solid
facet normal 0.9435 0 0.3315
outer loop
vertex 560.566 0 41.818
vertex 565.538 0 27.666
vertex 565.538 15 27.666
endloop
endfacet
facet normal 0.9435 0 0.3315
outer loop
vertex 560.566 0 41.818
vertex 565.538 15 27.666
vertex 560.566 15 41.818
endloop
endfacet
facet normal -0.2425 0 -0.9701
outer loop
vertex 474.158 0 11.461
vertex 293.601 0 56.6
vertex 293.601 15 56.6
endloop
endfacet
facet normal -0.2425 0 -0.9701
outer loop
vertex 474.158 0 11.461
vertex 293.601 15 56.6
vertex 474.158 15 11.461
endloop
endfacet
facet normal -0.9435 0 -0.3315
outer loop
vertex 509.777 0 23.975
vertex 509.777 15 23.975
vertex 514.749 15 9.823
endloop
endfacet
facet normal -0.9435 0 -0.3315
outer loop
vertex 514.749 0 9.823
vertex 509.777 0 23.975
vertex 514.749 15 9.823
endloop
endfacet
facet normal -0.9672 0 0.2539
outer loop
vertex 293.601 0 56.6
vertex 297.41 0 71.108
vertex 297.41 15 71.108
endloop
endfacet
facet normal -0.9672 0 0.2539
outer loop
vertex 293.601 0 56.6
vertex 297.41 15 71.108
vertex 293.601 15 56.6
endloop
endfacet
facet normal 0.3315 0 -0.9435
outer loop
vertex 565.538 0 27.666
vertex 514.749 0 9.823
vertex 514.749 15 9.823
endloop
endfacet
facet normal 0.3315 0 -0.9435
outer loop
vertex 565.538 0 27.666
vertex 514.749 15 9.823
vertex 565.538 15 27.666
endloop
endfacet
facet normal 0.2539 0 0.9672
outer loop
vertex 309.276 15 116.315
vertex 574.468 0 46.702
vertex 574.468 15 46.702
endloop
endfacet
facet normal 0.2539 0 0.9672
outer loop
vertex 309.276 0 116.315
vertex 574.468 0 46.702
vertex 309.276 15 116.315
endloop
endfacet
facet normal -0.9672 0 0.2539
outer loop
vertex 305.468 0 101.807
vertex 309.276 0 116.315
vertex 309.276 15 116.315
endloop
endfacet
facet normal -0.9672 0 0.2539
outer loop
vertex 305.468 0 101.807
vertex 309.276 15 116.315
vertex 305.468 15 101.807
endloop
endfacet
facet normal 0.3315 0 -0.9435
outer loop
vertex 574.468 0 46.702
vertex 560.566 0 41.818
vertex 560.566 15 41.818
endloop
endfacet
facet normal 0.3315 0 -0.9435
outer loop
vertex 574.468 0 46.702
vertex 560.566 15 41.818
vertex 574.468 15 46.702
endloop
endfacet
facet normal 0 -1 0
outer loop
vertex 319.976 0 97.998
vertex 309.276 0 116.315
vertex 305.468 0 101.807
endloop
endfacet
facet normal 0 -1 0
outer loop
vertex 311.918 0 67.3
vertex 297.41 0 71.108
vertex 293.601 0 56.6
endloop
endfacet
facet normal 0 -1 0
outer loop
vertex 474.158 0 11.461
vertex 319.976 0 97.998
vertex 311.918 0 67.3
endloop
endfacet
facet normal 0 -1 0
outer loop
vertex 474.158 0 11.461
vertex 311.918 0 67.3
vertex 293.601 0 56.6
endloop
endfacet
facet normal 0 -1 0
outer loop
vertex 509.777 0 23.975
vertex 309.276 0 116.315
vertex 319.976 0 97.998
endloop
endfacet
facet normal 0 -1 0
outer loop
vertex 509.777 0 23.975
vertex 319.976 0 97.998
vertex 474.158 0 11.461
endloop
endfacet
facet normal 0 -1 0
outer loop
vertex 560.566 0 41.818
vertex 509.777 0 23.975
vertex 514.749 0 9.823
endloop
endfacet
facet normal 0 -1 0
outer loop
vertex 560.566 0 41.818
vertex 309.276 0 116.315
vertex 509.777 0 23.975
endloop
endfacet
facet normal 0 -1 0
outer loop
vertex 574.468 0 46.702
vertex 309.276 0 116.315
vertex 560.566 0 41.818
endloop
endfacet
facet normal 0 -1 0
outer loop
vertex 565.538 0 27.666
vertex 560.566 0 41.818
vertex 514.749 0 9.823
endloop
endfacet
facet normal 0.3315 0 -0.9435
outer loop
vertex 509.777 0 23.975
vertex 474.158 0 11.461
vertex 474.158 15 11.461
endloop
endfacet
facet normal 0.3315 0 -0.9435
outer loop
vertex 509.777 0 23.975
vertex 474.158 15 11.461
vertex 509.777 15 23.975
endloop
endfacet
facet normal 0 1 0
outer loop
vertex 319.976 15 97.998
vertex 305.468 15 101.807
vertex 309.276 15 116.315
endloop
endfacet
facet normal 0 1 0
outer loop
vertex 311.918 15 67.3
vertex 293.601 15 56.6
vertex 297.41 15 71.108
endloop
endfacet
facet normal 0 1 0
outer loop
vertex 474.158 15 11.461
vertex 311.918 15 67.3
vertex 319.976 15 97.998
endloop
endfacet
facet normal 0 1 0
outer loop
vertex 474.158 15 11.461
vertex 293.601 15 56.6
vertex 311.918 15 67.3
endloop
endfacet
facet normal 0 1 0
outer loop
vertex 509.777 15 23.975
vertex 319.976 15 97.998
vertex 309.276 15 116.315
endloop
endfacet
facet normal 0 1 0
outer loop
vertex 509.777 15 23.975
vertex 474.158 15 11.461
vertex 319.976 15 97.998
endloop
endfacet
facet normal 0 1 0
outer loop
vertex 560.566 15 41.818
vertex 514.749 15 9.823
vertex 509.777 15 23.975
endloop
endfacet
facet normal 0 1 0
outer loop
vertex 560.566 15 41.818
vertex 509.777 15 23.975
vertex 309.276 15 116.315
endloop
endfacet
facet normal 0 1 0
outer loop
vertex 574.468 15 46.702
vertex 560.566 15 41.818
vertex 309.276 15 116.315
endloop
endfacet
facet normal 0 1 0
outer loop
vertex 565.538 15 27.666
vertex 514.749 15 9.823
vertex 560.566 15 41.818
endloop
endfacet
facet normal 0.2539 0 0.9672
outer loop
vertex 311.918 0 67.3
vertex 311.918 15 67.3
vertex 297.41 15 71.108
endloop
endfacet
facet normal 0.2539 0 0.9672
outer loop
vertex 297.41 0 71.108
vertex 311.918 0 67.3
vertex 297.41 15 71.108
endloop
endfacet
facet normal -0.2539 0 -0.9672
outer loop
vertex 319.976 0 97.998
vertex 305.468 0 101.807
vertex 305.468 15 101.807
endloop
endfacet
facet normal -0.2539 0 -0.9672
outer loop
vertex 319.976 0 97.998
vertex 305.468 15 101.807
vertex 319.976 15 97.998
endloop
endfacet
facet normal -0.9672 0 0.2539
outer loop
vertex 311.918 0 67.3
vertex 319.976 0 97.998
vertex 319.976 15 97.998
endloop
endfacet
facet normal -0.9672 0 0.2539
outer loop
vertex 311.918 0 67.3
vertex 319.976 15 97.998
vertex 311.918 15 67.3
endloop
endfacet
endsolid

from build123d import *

# Parameters (mm, degrees)
BOSS_EXTRUDE1_DEPTH             = 15
BOSS_EXTRUDE2_REACH             = 1239.023
BOSS_EXTRUDE2_DIRECTION_2_REACH = 1239.023
CUT_EXTRUDE2_DEPTH              = 1238.578280352
CUT_EXTRUDE2_DEPTH_BACK         = 1238.578280352
SKETCH5_W                       = 40
SKETCH5_H                       = 40
CUT_EXTRUDE3_DEPTH              = 1238.578280352
BOSS_EXTRUDE4_DEPTH             = 75
CUT_EXTRUDE4_DEPTH              = 1241.107934819
CUT_EXTRUDE4_DEPTH_BACK         = 1241.107934819
SKETCH8_W                       = 15
SKETCH8_H                       = 73.7
FILLET1_R                       = 5
CUT_EXTRUDE5_DEPTH              = 1241.107934819
CUT_EXTRUDE5_DEPTH_BACK         = 1241.107934819
SKETCH9_W                       = 25
SKETCH9_H                       = 15
SKETCH9_W_2                     = 15
CUT_EXTRUDE6_DEPTH              = 1241.107934819
CUT_EXTRUDE6_DEPTH_BACK         = 1241.107934819
SKETCH10_W                      = 1728.920732784
SKETCH10_H                      = 178.853868908
SKETCH10_W_2                    = 1650
SKETCH10_H_2                    = 15
SKETCH11_W                      = 1852.680615207
SKETCH11_H                      = 1075.927112831
CUT_EXTRUDE7_DEPTH              = 1238.022635201


with BuildPart() as part:
    # Sketch1 → Boss-Extrude1 (new body)
    with BuildSketch(Plane(origin=(0, 0, 0), x_dir=(1, 0, 0), z_dir=(0, 1, 0))):
        Polygon((-450, 300), (-400, 300), (-200, 250), (600, 40), (1200, 40), (1200, -40), (600, -40), (-200, -250), (-400, -300), (-450, -300), align=None)
    extrude(amount=BOSS_EXTRUDE1_DEPTH)

    # Boss-Extrude2: up to this face of the body (flat: up to its plane)
    boss_extrude2_end = Plane(part.part.faces().sort_by_distance((-425, 7.5, 300))[0])
    # Sketch2 → Boss-Extrude2 (add, up to the picked face)
    with BuildSketch(Plane.XY, mode=Mode.PRIVATE) as boss_extrude2_sk1:
        with BuildLine():
            Line((-425, 0), (-450, 0))
            Line((-450, 0), (-450, -40))
            Line((-450, -40), (-440, -40))
            Line((-440, -40), (-440, -15))
            ThreePointArc((-440, -15), (-435.606601718, -4.393398282), (-425, 0))
        make_face()
    boss_extrude2_tool1 = split(extrude(boss_extrude2_sk1.sketch, amount=BOSS_EXTRUDE2_REACH, mode=Mode.PRIVATE), bisect_by=boss_extrude2_end, keep=Keep.BOTH, mode=Mode.PRIVATE)
    # Sketch2 → Boss-Extrude2 (add, up to the picked face)
    with BuildSketch(Plane.XY, mode=Mode.PRIVATE) as boss_extrude2_sk2:
        with BuildLine():
            Line((-400, 0), (-425, 0))
            ThreePointArc((-425, 0), (-414.393398282, -4.393398282), (-410, -15))
            Line((-410, -15), (-410, -40))
            Line((-410, -40), (-400, -40))
            Line((-400, -40), (-400, 0))
        make_face()
    boss_extrude2_tool2 = split(extrude(boss_extrude2_sk2.sketch, amount=BOSS_EXTRUDE2_REACH, mode=Mode.PRIVATE), bisect_by=boss_extrude2_end, keep=Keep.BOTH, mode=Mode.PRIVATE)
    add(boss_extrude2_tool1.solids().sort_by(Axis((-444.100555, -18.206662, 0), (0, 0, 1)))[0])
    add(boss_extrude2_tool2.solids().sort_by(Axis((-405.899445, -18.206662, 0), (0, 0, 1)))[0])

    # Boss-Extrude2 direction 2: up to this face of the body (flat: up to its plane)
    boss_extrude2_direction_2_end = Plane(part.part.faces().sort_by_distance((-425, 7.5, -300))[0])
    # Sketch2 → Boss-Extrude2 direction 2 (add, up to the picked face)
    with BuildSketch(Plane.XY, mode=Mode.PRIVATE) as boss_extrude2_direction_2_sk1:
        with BuildLine():
            Line((-425, 0), (-450, 0))
            Line((-450, 0), (-450, -40))
            Line((-450, -40), (-440, -40))
            Line((-440, -40), (-440, -15))
            ThreePointArc((-440, -15), (-435.606601718, -4.393398282), (-425, 0))
        make_face()
    boss_extrude2_direction_2_tool1 = split(extrude(boss_extrude2_direction_2_sk1.sketch, amount=-BOSS_EXTRUDE2_DIRECTION_2_REACH, mode=Mode.PRIVATE), bisect_by=boss_extrude2_direction_2_end, keep=Keep.BOTH, mode=Mode.PRIVATE)
    # Sketch2 → Boss-Extrude2 direction 2 (add, up to the picked face)
    with BuildSketch(Plane.XY, mode=Mode.PRIVATE) as boss_extrude2_direction_2_sk2:
        with BuildLine():
            Line((-400, 0), (-425, 0))
            ThreePointArc((-425, 0), (-414.393398282, -4.393398282), (-410, -15))
            Line((-410, -15), (-410, -40))
            Line((-410, -40), (-400, -40))
            Line((-400, -40), (-400, 0))
        make_face()
    boss_extrude2_direction_2_tool2 = split(extrude(boss_extrude2_direction_2_sk2.sketch, amount=-BOSS_EXTRUDE2_DIRECTION_2_REACH, mode=Mode.PRIVATE), bisect_by=boss_extrude2_direction_2_end, keep=Keep.BOTH, mode=Mode.PRIVATE)
    add(boss_extrude2_direction_2_tool1.solids().sort_by(Axis((-444.100555, -18.206662, 0), (0, 0, -1)))[0])
    add(boss_extrude2_direction_2_tool2.solids().sort_by(Axis((-405.899445, -18.206662, 0), (0, 0, -1)))[0])

    # Sketch4 → Cut-Extrude2 (cut, two sides: drawn at the far end of the back side and taken through both)
    with BuildSketch(Plane(origin=(0, 0, 0), x_dir=(1, 0, 0), z_dir=(0, 1, 0)).offset(-CUT_EXTRUDE2_DEPTH_BACK)):
        Polygon((-450, 230), (-400, 230), (-150, 167.5), (-150, -167.5), (-400, -230), (-450, -230), align=None)
        Polygon((-100, 155), (-100, -155), (520, 0), align=None)
    extrude(amount=CUT_EXTRUDE2_DEPTH + CUT_EXTRUDE2_DEPTH_BACK, mode=Mode.SUBTRACT)

    # Sketch5 → Cut-Extrude3 (cut, through all)
    with BuildSketch(Plane(origin=(0, 0, 0), x_dir=(0, 0, -1), z_dir=(1, 0, 0))):
        with Locations((-265, -20)):
            Rectangle(SKETCH5_W, SKETCH5_H)
        with Locations((265, -20)):
            Rectangle(SKETCH5_W, SKETCH5_H)
    extrude(amount=-CUT_EXTRUDE3_DEPTH, mode=Mode.SUBTRACT)

    # Sketch7 → Boss-Extrude4 (add)
    with BuildSketch(Plane(origin=(1200, 0, 0), x_dir=(0, 0, -1), z_dir=(1, 0, 0))):
        with BuildLine():
            Line((-87.5, 50), (-40, 15))
            Line((-40, 15), (40, 15))
            Line((40, 15), (87.5, 50))
            Line((87.5, 50), (87.5, 88.7))
            Line((87.5, 88.7), (58.5, 88.7))
            Line((58.5, 88.7), (58.5, 63.2))
            Line((58.5, 63.2), (48.5, 63.2))
            Line((48.5, 63.2), (48.5, 88.7))
            Line((48.5, 88.7), (20, 88.7))
            Line((20, 88.7), (20, 50))
            ThreePointArc((20, 50), (0, 30), (-20, 50))
            Line((-20, 50), (-20, 88.7))
            Line((-20, 88.7), (-63, 88.7))
            Line((-63, 88.7), (-63, 63.2))
            Line((-63, 63.2), (-73, 63.2))
            Line((-73, 63.2), (-73, 88.7))
            Line((-73, 88.7), (-87.5, 88.7))
            Line((-87.5, 88.7), (-87.5, 50))
        make_face()
    extrude(amount=-BOSS_EXTRUDE4_DEPTH)

    # Sketch8 → Cut-Extrude4 (cut, two sides: drawn at the far end of the back side and taken through both)
    with BuildSketch(Plane.XY.offset(-CUT_EXTRUDE4_DEPTH_BACK)):
        with Locations((1147.5, 51.85)):
            Rectangle(SKETCH8_W, SKETCH8_H)
        with Locations((1177.5, 51.85)):
            Rectangle(SKETCH8_W, SKETCH8_H)
    extrude(amount=CUT_EXTRUDE4_DEPTH + CUT_EXTRUDE4_DEPTH_BACK, mode=Mode.SUBTRACT)

    # Fillet1
    fillet1_edges = [part.edges().sort_by_distance(p)[0] for p in [
        (1192.5, 50, 87.5),
        (1162.5, 50, 87.5),
        (1132.5, 50, 87.5),
        (1192.5, 50, -87.5),
        (1162.5, 50, -87.5),
        (1132.5, 50, -87.5),
        (1192.5, 88.7, -87.5),
        (1162.5, 88.7, -87.5),
        (1132.5, 88.7, -87.5),
        (1132.5, 88.7, -58.5),
        (1162.5, 88.7, -58.5),
        (1192.5, 88.7, -58.5),
        (1192.5, 88.7, -48.5),
        (1162.5, 88.7, -48.5),
        (1132.5, 88.7, -48.5),
        (1192.5, 88.7, -20),
        (1162.5, 88.7, -20),
        (1132.5, 88.7, -20),
        (1192.5, 88.7, 63),
        (1162.5, 88.7, 63),
        (1132.5, 88.7, 63),
        (1132.5, 88.7, 87.5),
        (1162.5, 88.7, 87.5),
        (1192.5, 88.7, 87.5),
        (1192.5, 88.7, 73),
        (1162.5, 88.7, 73),
        (1132.5, 88.7, 73),
        (1192.5, 88.7, 20),
        (1162.5, 88.7, 20),
        (1132.5, 88.7, 20),
        (600, 7.5, 40),
        (600, 7.5, -40),
        (520, 7.5, 0),
        (-440, -40, -292.5),
        (-440, -40, -237.5),
        (-400, -40, -292.5),
        (-400, -40, -237.5),
        (-450, -40, -237.5),
        (-410, -40, -237.5),
        (-450, -40, -292.5),
        (-410, -40, -292.5),
        (-150, 7.5, 167.5),
        (-100, 7.5, 155),
        (-150, 7.5, -167.5),
        (-100, 7.5, -155),
        (-450, -40, 237.5),
        (-410, -40, 237.5),
        (-440, -40, 237.5),
        (-400, -40, 237.5),
        (-450, -40, 292.5),
        (-440, -40, 292.5),
        (-400, -40, 292.5),
        (-410, -40, 292.5),
    ]]
    fillet(fillet1_edges, radius=FILLET1_R - 0.0001)  # a hair under: the kernel refuses the full size

    # Sketch9 → Cut-Extrude5 (cut, two sides: drawn at the far end of the back side and taken through both)
    with BuildSketch(Plane(origin=(0, 0, 0), x_dir=(1, 0, 0), z_dir=(0, 1, 0)).offset(-CUT_EXTRUDE5_DEPTH_BACK)):
        with Locations((-425, -292.5)):
            Rectangle(SKETCH9_W, SKETCH9_H)
        with Locations((1192.5, -32.5)):
            Rectangle(SKETCH9_W_2, SKETCH9_H)
        with Locations((1192.5, 32.5)):
            Rectangle(SKETCH9_W_2, SKETCH9_H)
        with Locations((1162.5, 32.5)):
            Rectangle(SKETCH9_W_2, SKETCH9_H)
        with Locations((1132.5, 32.5)):
            Rectangle(SKETCH9_W_2, SKETCH9_H)
        with Locations((1132.5, -32.5)):
            Rectangle(SKETCH9_W_2, SKETCH9_H)
        with Locations((1162.5, -32.5)):
            Rectangle(SKETCH9_W_2, SKETCH9_H)
        with Locations((-425, -237.5)):
            Rectangle(SKETCH9_W, SKETCH9_H)
        with Locations((-425, 237.5)):
            Rectangle(SKETCH9_W, SKETCH9_H)
        with Locations((-425, 292.5)):
            Rectangle(SKETCH9_W, SKETCH9_H)
    extrude(amount=CUT_EXTRUDE5_DEPTH + CUT_EXTRUDE5_DEPTH_BACK, mode=Mode.SUBTRACT)


with BuildPart() as cut_extrude5_piece_1:
    # of the separate pieces the step leaves, piece 1, a body of its own (cut_extrude5_pieces)
    add(part.part.solids().sort_by_distance((-400, -35.0001, -300))[0])


with BuildPart() as cut_extrude5_piece_2:
    # of the separate pieces the step leaves, piece 2, a body of its own (cut_extrude5_pieces)
    add(part.part.solids().sort_by_distance((1170, 48.501289589, 85.46603587))[0])


with BuildPart() as cut_extrude5_piece_3:
    # of the separate pieces the step leaves, piece 3, a body of its own (cut_extrude5_pieces)
    add(part.part.solids().sort_by_distance((1170, 48.501289589, -85.46603587))[0])


with BuildPart() as cut_extrude5_piece_4:
    # of the separate pieces the step leaves, piece 4, a body of its own (cut_extrude5_pieces)
    add(part.part.solids().sort_by_distance((1125, 83.7001, 73))[0])


with BuildPart() as cut_extrude5_piece_5:
    # of the separate pieces the step leaves, piece 5, a body of its own (cut_extrude5_pieces)
    add(part.part.solids().sort_by_distance((1200, 48.501289589, 85.46603587))[0])


with BuildPart() as cut_extrude5_piece_6:
    # of the separate pieces the step leaves, piece 6, a body of its own (cut_extrude5_pieces)
    add(part.part.solids().sort_by_distance((1200, 48.501289589, -85.46603587))[0])


with BuildPart() as cut_extrude5_piece_7:
    # of the separate pieces the step leaves, piece 7, a body of its own (cut_extrude5_pieces)
    add(part.part.solids().sort_by_distance((1125, 88.7, -40))[0])


with BuildPart() as cut_extrude6_tool:
    # Sketch10 → Cut-Extrude6 (new, two sides: drawn at the far end of the back side and taken through both)
    with BuildSketch(Plane.XY.offset(-CUT_EXTRUDE6_DEPTH_BACK)):
        with Locations((378.379601058, 20.599691165)):
            Rectangle(SKETCH10_W, SKETCH10_H)
        with Locations((375, 7.5)):
            Rectangle(SKETCH10_W_2, SKETCH10_H_2, mode=Mode.SUBTRACT)
    extrude(amount=CUT_EXTRUDE6_DEPTH + CUT_EXTRUDE6_DEPTH_BACK)


with BuildPart() as cut_extrude5_piece_1_1:
    add(cut_extrude5_piece_1.part)

    # Cut-Extrude6: cut by cut_extrude6_tool
    add(cut_extrude6_tool.part, mode=Mode.SUBTRACT)

    # Sketch11 → Cut-Extrude7 (cut, through all)
    # profile 1 of 8: a face of its own
    with BuildSketch(Plane(origin=(0, 0, 0), x_dir=(1, 0, 0), z_dir=(0, 1, 0))):
        with Locations((324.970767393, -26.108881651)):
            Rectangle(SKETCH11_W, SKETCH11_H)
        Polygon((309.276307823, -116.314969197), (-450, -315.625), (-450, -242.5), (-450, -230), (-400, -230), (-150, -167.5), (-135, -163.75), (-115, -158.75), (-100, -155), (293.601058917, -56.599735271), (308.154197556, -52.961450611), (474.15750273, -11.460624318), (500.597149997, -4.850712501), (514.749174704, -9.82265344), (565.538165046, -27.666026778), (600.645318554, -40), (574.718248814, -46.789992423), (323.784772304, -112.50649727), align=None, mode=Mode.SUBTRACT)
    # profile 2 of 8: a face of its own
    with BuildSketch(Plane(origin=(0, 0, 0), x_dir=(1, 0, 0), z_dir=(0, 1, 0))):
        Polygon((-450, -230), (-450, -242.5), (-400, -230), align=None)
    # profile 3 of 8: a face of its own
    with BuildSketch(Plane(origin=(0, 0, 0), x_dir=(1, 0, 0), z_dir=(0, 1, 0))):
        Polygon((-450, -242.5), (-450, -315.625), (309.276307823, -116.314969197), (305.467835897, -101.806504716), (297.409530844, -71.108199751), (293.601058917, -56.599735271), (-100, -155), (-100, -182.5), (-115, -182.5), (-115, -158.75), (-135, -163.75), (-135, -182.5), (-150, -182.5), (-150, -167.5), (-400, -230), align=None)
    # profile 4 of 8: a face of its own
    with BuildSketch(Plane(origin=(0, 0, 0), x_dir=(1, 0, 0), z_dir=(0, 1, 0))):
        Polygon((-135, -163.75), (-150, -167.5), (-150, -182.5), (-135, -182.5), align=None)
    # profile 5 of 8: a face of its own
    with BuildSketch(Plane(origin=(0, 0, 0), x_dir=(1, 0, 0), z_dir=(0, 1, 0))):
        Polygon((-100, -182.5), (-100, -155), (-115, -158.75), (-115, -182.5), align=None)
    # profile 6 of 8: a face of its own
    with BuildSketch(Plane(origin=(0, 0, 0), x_dir=(1, 0, 0), z_dir=(0, 1, 0))):
        Polygon((560.566224107, -41.818051484), (574.718248814, -46.789992423), (600.645318554, -40), (565.538165046, -27.666026778), align=None)
    # profile 7 of 8: a face of its own
    with BuildSketch(Plane(origin=(0, 0, 0), x_dir=(1, 0, 0), z_dir=(0, 1, 0))):
        Polygon((474.15750273, -11.460624318), (509.777233765, -23.974678146), (514.749174704, -9.82265344), (500.597149997, -4.850712501), align=None)
    # profile 8 of 8: a face of its own
    with BuildSketch(Plane(origin=(0, 0, 0), x_dir=(1, 0, 0), z_dir=(0, 1, 0))):
        Polygon((297.409530844, -71.108199751), (305.467835897, -101.806504716), (319.976300377, -97.99803279), (311.917995324, -67.299727825), align=None)
    extrude(amount=CUT_EXTRUDE7_DEPTH, mode=Mode.SUBTRACT)


with BuildPart() as cut_extrude5_piece_2_1:
    add(cut_extrude5_piece_2.part)

    # Cut-Extrude6: cut by cut_extrude6_tool
    add(cut_extrude6_tool.part, mode=Mode.SUBTRACT)


with BuildPart() as cut_extrude5_piece_3_1:
    add(cut_extrude5_piece_3.part)

    # Cut-Extrude6: cut by cut_extrude6_tool
    add(cut_extrude6_tool.part, mode=Mode.SUBTRACT)


with BuildPart() as cut_extrude5_piece_4_1:
    add(cut_extrude5_piece_4.part)

    # Cut-Extrude6: cut by cut_extrude6_tool
    add(cut_extrude6_tool.part, mode=Mode.SUBTRACT)


with BuildPart() as cut_extrude5_piece_5_1:
    add(cut_extrude5_piece_5.part)

    # Cut-Extrude6: cut by cut_extrude6_tool
    add(cut_extrude6_tool.part, mode=Mode.SUBTRACT)


with BuildPart() as cut_extrude5_piece_6_1:
    add(cut_extrude5_piece_6.part)

    # Cut-Extrude6: cut by cut_extrude6_tool
    add(cut_extrude6_tool.part, mode=Mode.SUBTRACT)


with BuildPart() as cut_extrude5_piece_7_1:
    add(cut_extrude5_piece_7.part)

    # Cut-Extrude6: cut by cut_extrude6_tool
    add(cut_extrude6_tool.part, mode=Mode.SUBTRACT)


solid = cut_extrude5_piece_1_1.part
